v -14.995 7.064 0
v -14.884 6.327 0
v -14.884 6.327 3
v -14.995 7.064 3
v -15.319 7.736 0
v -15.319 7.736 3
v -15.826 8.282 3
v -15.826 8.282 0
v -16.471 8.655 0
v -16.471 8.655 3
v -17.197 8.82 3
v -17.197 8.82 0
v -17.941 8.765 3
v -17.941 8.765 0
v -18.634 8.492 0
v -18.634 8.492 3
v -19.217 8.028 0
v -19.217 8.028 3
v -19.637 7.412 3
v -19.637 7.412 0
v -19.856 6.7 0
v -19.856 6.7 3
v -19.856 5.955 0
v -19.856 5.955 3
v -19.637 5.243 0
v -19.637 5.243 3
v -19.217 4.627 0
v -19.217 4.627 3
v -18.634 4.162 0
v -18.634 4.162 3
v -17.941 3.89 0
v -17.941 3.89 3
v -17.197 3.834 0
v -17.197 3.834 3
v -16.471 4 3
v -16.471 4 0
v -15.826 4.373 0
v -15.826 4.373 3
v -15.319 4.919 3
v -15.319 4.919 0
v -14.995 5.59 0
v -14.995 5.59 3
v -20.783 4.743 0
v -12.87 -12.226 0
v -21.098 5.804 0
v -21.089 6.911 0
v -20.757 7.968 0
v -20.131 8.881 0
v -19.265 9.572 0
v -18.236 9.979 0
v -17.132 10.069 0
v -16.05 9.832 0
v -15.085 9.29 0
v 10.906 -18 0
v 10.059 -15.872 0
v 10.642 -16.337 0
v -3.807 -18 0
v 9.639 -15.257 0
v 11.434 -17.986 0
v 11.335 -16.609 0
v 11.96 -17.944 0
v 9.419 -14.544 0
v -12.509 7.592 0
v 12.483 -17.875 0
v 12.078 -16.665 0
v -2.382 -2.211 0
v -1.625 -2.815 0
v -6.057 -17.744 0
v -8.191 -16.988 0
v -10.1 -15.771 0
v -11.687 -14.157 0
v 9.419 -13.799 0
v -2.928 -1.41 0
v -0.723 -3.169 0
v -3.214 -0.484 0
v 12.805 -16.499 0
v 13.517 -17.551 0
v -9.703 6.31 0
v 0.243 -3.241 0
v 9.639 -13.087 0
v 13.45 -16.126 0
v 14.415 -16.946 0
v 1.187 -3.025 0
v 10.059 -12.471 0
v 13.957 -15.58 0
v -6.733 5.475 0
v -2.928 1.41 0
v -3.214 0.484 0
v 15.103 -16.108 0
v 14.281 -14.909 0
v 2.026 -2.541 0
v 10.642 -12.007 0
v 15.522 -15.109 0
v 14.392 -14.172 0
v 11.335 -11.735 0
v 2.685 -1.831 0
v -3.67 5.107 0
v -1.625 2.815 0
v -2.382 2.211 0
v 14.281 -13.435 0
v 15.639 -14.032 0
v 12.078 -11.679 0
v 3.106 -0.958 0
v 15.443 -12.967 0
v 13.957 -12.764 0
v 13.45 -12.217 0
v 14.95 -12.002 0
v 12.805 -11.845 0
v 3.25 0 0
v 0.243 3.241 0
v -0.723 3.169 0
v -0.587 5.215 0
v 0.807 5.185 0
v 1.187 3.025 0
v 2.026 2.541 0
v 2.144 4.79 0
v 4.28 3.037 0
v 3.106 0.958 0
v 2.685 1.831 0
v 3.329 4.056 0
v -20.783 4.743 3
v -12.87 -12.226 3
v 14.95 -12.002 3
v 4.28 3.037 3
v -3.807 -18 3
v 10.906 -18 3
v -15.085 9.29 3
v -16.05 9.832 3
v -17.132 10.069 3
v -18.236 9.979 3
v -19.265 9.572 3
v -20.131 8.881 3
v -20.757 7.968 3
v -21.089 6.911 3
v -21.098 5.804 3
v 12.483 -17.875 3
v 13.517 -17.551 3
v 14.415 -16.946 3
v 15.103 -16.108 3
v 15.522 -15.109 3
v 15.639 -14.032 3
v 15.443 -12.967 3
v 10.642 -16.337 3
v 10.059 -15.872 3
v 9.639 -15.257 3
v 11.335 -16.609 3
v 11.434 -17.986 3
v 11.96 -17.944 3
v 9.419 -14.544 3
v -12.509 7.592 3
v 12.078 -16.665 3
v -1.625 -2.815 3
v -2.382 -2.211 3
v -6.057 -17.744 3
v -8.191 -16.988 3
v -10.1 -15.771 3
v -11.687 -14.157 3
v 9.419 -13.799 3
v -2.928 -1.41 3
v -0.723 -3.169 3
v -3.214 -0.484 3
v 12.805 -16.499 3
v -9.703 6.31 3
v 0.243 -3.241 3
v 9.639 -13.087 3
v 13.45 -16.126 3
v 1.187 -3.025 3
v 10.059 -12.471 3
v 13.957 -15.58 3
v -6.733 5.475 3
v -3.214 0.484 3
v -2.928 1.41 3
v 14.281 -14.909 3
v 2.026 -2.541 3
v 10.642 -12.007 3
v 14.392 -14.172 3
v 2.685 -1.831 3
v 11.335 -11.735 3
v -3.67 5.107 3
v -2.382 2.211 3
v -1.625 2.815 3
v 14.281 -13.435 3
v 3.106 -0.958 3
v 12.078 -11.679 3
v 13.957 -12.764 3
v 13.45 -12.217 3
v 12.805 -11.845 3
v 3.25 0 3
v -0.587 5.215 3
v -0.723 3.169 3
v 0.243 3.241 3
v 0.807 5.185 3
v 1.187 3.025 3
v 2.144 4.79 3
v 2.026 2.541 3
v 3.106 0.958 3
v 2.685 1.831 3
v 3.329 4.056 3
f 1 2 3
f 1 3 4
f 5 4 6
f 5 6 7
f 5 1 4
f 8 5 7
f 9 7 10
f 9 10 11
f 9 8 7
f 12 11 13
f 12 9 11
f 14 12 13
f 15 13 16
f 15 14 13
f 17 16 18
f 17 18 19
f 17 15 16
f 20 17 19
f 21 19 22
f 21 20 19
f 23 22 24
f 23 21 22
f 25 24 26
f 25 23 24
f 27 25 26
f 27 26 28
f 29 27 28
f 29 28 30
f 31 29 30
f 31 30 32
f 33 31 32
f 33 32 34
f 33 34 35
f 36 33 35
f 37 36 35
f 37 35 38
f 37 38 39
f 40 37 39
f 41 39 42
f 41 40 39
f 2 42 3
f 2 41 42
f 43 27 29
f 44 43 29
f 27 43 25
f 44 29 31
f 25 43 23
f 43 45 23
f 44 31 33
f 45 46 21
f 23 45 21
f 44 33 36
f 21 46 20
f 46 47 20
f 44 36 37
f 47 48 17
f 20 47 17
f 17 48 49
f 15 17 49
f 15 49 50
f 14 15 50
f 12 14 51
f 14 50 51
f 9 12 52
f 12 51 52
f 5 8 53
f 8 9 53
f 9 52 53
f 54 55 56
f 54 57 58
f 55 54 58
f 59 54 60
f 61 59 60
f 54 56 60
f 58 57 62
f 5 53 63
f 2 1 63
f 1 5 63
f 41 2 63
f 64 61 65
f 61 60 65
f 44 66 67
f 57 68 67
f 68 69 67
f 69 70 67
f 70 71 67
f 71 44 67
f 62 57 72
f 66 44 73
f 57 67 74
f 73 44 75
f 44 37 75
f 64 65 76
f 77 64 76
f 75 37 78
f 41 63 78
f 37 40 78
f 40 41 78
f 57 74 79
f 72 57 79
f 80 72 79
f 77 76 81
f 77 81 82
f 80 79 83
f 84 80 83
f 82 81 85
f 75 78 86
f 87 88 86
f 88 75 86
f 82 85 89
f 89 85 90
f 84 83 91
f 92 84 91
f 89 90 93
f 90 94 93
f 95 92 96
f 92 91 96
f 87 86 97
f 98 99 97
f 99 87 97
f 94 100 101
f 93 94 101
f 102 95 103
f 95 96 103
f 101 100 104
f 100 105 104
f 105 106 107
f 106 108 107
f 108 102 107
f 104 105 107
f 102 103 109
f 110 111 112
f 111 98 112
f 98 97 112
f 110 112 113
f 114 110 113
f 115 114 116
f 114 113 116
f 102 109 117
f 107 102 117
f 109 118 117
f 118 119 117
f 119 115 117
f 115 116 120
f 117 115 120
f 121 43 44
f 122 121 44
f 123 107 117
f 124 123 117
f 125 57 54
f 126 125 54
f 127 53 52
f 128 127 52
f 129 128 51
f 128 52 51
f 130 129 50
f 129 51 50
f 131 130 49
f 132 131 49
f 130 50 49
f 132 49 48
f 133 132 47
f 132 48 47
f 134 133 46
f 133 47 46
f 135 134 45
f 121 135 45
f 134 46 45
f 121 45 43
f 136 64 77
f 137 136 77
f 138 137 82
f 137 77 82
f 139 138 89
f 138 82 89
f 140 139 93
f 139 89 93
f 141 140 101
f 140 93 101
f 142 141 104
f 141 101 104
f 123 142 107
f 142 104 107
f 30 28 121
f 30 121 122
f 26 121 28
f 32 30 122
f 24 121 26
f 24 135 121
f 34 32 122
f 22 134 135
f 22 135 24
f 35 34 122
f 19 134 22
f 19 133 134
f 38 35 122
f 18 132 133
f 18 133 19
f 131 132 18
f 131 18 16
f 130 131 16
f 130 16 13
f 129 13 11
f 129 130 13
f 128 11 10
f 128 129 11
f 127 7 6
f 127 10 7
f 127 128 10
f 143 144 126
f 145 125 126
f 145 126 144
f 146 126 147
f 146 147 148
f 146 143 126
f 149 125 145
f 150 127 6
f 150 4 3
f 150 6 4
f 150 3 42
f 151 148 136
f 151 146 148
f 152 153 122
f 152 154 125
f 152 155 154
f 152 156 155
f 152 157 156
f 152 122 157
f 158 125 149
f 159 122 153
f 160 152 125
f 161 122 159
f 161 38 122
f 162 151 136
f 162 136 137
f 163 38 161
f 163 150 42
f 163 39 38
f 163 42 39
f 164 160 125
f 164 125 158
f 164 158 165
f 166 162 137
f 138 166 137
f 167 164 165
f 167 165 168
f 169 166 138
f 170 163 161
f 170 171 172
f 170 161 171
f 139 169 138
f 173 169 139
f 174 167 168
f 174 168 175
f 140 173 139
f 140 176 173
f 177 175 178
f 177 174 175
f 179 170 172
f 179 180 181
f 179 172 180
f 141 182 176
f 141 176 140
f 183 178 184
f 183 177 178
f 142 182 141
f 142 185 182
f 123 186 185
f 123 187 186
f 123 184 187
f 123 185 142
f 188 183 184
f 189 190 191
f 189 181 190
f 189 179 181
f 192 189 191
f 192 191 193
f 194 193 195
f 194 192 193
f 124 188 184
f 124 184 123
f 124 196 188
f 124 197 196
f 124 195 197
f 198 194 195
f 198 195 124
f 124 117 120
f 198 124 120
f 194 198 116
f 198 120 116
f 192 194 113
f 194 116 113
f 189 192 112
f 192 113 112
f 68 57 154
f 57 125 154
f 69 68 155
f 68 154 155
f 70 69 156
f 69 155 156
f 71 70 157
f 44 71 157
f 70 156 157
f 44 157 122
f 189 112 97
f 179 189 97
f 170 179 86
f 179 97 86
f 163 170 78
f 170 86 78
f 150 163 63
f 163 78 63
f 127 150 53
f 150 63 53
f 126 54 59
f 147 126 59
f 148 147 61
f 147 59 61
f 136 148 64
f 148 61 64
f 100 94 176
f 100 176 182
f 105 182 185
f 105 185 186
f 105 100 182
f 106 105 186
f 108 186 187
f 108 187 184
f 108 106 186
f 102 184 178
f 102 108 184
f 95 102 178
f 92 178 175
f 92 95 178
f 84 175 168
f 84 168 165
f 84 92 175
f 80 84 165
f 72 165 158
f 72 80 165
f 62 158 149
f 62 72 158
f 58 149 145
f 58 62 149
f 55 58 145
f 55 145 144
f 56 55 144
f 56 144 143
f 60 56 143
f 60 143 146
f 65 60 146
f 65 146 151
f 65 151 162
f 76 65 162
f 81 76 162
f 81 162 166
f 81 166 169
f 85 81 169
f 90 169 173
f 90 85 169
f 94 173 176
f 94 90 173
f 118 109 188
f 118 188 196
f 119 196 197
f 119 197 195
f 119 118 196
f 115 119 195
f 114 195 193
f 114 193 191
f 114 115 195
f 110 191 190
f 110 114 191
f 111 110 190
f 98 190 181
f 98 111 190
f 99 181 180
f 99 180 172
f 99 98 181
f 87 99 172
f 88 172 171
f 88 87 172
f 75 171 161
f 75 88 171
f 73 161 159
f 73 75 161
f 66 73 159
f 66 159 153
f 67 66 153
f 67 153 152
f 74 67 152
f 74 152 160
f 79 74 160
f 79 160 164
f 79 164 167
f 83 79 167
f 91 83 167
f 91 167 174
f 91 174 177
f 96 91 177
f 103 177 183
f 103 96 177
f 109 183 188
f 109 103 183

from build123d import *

# Parameters (mm, degrees)
SKETCH1_R           = 2.5
SKETCH1_R_2         = 3.25
BOSS_EXTRUDE1_DEPTH = 3
FILLET1_R           = 10


with BuildPart() as part:
    # Sketch1 → Boss-Extrude1 (new body)
    with BuildSketch(Plane.XY):
        with BuildLine():
            Line((-10.17794051, -18), (10.906121257, -18))
            ThreePointArc((10.906121257, -18), (11.696957788, -17.968679831), (12.482840492, -17.874915516))
            ThreePointArc((12.482840492, -17.874915516), (15.348919612, -15.624144149), (14.949938417, -12.001825103))
            Line((14.949938417, -12.001825103), (4.279753476, 3.036604394))
            ThreePointArc((4.279753476, 3.036604394), (2.143793972, 4.789718516), (-0.586612431, 5.214704394))
            ThreePointArc((-0.586612431, 5.214704394), (-8.234060053, 5.835429339), (-15.085056175, 9.289789878))
            ThreePointArc((-15.085056175, 9.289789878), (-19.723438647, 9.258412309), (-20.782967686, 4.74255417))
            Line((-20.782967686, 4.74255417), (-10.17794051, -18))
        make_face()
        with Locations((-17.384313485, 6.327372652)):
            Circle(SKETCH1_R, mode=Mode.SUBTRACT)
        with Locations((11.891570779, -14.171822198)):
            Circle(SKETCH1_R, mode=Mode.SUBTRACT)
        Circle(SKETCH1_R_2, mode=Mode.SUBTRACT)
    extrude(amount=BOSS_EXTRUDE1_DEPTH)

    # Fillet1
    fillet1_edges = [part.edges().sort_by_distance(p)[0] for p in [
        (-10.17794051, -18, 1.5),
    ]]
    fillet(fillet1_edges, radius=FILLET1_R)


solid = part.part
